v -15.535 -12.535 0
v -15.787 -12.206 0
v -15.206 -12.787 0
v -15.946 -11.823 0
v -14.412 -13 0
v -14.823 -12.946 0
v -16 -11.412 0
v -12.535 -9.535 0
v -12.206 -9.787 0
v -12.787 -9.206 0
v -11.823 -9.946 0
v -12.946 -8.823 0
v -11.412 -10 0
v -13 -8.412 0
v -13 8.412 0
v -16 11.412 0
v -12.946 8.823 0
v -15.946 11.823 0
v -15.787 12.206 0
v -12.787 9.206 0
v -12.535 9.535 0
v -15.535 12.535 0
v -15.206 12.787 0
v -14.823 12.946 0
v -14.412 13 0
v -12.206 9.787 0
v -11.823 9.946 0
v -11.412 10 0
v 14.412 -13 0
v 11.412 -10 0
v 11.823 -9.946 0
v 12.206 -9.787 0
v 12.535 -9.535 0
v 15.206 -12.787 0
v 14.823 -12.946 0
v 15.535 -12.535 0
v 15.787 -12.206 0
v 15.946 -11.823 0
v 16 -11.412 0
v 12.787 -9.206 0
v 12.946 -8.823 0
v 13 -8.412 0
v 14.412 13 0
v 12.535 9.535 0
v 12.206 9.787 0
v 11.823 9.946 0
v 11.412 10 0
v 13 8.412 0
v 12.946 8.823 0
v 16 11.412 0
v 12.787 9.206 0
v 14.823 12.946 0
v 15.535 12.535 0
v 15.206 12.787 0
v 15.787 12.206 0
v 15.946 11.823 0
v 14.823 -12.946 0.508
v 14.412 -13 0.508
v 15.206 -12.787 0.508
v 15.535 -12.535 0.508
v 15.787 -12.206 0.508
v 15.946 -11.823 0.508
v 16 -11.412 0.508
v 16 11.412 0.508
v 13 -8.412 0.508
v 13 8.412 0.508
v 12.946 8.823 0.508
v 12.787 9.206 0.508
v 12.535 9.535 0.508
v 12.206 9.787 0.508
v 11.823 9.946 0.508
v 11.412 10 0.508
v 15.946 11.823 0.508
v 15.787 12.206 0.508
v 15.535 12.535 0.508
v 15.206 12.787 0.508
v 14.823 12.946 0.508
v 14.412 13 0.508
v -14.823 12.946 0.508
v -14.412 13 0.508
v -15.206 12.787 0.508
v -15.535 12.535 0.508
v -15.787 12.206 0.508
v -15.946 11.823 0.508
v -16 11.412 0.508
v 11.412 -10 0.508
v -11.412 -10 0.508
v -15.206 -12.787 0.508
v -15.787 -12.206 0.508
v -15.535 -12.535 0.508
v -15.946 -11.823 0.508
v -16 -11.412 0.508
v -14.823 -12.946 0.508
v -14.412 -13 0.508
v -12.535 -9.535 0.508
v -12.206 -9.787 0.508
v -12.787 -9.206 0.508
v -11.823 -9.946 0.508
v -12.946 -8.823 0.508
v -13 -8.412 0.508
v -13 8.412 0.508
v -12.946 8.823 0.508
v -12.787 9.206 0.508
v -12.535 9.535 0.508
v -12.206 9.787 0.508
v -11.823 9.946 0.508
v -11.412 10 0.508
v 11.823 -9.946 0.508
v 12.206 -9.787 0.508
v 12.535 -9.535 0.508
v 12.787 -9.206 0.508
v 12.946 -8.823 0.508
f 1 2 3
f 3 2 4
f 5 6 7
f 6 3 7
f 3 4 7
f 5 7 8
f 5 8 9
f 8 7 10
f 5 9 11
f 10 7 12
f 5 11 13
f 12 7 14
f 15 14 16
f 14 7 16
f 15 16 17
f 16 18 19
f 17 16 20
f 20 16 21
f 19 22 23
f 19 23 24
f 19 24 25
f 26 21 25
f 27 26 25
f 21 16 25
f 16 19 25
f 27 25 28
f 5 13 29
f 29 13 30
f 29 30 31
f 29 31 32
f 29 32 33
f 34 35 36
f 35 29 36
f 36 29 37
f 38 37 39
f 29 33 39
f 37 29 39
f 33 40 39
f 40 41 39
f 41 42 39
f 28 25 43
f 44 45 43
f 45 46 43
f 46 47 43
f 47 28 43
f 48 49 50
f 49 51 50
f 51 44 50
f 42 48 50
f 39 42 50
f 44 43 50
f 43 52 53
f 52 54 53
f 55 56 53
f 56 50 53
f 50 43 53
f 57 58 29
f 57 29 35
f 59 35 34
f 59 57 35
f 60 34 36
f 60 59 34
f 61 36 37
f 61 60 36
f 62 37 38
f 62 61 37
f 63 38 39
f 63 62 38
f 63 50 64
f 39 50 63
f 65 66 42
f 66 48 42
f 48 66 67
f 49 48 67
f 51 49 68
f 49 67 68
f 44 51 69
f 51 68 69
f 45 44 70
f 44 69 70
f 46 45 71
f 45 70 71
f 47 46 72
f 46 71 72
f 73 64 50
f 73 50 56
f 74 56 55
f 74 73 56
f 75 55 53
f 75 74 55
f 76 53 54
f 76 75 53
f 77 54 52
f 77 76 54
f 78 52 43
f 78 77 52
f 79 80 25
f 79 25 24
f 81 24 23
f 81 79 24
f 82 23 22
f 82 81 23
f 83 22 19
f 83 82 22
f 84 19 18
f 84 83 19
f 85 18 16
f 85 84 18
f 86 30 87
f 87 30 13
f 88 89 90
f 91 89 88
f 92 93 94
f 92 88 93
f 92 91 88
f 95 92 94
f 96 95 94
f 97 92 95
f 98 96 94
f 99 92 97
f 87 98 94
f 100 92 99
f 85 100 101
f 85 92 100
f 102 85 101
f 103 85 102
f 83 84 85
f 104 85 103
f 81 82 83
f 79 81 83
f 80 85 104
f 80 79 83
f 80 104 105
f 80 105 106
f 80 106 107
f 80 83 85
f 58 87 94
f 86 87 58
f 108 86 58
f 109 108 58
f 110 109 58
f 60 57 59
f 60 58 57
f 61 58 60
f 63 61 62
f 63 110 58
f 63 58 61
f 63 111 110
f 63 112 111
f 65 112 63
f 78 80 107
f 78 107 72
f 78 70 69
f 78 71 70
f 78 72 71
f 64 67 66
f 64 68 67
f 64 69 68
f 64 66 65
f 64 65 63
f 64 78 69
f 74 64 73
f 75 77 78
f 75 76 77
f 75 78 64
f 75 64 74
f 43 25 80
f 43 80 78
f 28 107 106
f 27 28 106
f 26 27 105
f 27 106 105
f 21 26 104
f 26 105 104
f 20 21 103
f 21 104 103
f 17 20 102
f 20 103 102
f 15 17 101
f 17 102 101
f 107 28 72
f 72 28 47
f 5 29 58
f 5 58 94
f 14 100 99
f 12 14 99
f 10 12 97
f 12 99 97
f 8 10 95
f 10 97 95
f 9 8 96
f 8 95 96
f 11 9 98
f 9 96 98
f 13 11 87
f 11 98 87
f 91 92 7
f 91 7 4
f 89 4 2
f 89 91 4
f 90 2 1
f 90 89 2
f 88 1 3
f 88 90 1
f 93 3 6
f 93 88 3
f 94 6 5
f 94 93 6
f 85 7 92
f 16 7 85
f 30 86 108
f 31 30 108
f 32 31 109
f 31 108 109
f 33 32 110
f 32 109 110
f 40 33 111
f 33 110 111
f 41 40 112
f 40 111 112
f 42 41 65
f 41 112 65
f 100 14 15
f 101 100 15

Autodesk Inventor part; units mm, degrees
ref_plane "YZ Plane" through (0, 0, 0) normal (1, 0, 0) x (0, 1, 0)
ref_plane "XZ Plane" through (0, 0, 0) normal (0, 1, 0) x (-1, 0, 0)
ref_plane "XY Plane" through (0, 0, 0) normal (0, 0, 1) x (1, 0, 0)
sketch "Sketch1" plane through (0, 0, 0) normal (0, 0, 1) x (1, 0, 0)
  line L0 (-13, 10) -> (13, 10)
  line L1 (13, 10) -> (13, -10)
  line L2 (13, -10) -> (-13, -10)
  line L3 (-13, -10) -> (-13, 10)
  line L4 (-13, 10) -> (13, -10) construction
  line L5 (13, 10) -> (-13, -10) construction
  line L6 (-16, 13) -> (16, 13)
  line L7 (16, 13) -> (16, -13)
  line L8 (16, -13) -> (-16, -13)
  line L9 (-16, -13) -> (-16, 13)
  line L10 (-16, 13) -> (16, -13) construction
  line L11 (16, 13) -> (-16, -13) construction
  point P0 (0, 0)
  dimension "d0" = 26
  dimension "d1" = 20
  dimension "d2" = 3
  dimension "d3" = 3
extrude "Extrusion1" add sketch "Sketch1" along normal blind 0.508
fillet "Fillet1" radius 1.5875 8 edges at (-13, 10, 0.254) (-13, -10, 0.254) (13, -10, 0.254) (13, 10, 0.254) (16, -13, 0.254) (16, 13, 0.254) (-16, 13, 0.254) (-16, -13, 0.254)
properties part number "Display Bezel" material "Aluminum 6061"
